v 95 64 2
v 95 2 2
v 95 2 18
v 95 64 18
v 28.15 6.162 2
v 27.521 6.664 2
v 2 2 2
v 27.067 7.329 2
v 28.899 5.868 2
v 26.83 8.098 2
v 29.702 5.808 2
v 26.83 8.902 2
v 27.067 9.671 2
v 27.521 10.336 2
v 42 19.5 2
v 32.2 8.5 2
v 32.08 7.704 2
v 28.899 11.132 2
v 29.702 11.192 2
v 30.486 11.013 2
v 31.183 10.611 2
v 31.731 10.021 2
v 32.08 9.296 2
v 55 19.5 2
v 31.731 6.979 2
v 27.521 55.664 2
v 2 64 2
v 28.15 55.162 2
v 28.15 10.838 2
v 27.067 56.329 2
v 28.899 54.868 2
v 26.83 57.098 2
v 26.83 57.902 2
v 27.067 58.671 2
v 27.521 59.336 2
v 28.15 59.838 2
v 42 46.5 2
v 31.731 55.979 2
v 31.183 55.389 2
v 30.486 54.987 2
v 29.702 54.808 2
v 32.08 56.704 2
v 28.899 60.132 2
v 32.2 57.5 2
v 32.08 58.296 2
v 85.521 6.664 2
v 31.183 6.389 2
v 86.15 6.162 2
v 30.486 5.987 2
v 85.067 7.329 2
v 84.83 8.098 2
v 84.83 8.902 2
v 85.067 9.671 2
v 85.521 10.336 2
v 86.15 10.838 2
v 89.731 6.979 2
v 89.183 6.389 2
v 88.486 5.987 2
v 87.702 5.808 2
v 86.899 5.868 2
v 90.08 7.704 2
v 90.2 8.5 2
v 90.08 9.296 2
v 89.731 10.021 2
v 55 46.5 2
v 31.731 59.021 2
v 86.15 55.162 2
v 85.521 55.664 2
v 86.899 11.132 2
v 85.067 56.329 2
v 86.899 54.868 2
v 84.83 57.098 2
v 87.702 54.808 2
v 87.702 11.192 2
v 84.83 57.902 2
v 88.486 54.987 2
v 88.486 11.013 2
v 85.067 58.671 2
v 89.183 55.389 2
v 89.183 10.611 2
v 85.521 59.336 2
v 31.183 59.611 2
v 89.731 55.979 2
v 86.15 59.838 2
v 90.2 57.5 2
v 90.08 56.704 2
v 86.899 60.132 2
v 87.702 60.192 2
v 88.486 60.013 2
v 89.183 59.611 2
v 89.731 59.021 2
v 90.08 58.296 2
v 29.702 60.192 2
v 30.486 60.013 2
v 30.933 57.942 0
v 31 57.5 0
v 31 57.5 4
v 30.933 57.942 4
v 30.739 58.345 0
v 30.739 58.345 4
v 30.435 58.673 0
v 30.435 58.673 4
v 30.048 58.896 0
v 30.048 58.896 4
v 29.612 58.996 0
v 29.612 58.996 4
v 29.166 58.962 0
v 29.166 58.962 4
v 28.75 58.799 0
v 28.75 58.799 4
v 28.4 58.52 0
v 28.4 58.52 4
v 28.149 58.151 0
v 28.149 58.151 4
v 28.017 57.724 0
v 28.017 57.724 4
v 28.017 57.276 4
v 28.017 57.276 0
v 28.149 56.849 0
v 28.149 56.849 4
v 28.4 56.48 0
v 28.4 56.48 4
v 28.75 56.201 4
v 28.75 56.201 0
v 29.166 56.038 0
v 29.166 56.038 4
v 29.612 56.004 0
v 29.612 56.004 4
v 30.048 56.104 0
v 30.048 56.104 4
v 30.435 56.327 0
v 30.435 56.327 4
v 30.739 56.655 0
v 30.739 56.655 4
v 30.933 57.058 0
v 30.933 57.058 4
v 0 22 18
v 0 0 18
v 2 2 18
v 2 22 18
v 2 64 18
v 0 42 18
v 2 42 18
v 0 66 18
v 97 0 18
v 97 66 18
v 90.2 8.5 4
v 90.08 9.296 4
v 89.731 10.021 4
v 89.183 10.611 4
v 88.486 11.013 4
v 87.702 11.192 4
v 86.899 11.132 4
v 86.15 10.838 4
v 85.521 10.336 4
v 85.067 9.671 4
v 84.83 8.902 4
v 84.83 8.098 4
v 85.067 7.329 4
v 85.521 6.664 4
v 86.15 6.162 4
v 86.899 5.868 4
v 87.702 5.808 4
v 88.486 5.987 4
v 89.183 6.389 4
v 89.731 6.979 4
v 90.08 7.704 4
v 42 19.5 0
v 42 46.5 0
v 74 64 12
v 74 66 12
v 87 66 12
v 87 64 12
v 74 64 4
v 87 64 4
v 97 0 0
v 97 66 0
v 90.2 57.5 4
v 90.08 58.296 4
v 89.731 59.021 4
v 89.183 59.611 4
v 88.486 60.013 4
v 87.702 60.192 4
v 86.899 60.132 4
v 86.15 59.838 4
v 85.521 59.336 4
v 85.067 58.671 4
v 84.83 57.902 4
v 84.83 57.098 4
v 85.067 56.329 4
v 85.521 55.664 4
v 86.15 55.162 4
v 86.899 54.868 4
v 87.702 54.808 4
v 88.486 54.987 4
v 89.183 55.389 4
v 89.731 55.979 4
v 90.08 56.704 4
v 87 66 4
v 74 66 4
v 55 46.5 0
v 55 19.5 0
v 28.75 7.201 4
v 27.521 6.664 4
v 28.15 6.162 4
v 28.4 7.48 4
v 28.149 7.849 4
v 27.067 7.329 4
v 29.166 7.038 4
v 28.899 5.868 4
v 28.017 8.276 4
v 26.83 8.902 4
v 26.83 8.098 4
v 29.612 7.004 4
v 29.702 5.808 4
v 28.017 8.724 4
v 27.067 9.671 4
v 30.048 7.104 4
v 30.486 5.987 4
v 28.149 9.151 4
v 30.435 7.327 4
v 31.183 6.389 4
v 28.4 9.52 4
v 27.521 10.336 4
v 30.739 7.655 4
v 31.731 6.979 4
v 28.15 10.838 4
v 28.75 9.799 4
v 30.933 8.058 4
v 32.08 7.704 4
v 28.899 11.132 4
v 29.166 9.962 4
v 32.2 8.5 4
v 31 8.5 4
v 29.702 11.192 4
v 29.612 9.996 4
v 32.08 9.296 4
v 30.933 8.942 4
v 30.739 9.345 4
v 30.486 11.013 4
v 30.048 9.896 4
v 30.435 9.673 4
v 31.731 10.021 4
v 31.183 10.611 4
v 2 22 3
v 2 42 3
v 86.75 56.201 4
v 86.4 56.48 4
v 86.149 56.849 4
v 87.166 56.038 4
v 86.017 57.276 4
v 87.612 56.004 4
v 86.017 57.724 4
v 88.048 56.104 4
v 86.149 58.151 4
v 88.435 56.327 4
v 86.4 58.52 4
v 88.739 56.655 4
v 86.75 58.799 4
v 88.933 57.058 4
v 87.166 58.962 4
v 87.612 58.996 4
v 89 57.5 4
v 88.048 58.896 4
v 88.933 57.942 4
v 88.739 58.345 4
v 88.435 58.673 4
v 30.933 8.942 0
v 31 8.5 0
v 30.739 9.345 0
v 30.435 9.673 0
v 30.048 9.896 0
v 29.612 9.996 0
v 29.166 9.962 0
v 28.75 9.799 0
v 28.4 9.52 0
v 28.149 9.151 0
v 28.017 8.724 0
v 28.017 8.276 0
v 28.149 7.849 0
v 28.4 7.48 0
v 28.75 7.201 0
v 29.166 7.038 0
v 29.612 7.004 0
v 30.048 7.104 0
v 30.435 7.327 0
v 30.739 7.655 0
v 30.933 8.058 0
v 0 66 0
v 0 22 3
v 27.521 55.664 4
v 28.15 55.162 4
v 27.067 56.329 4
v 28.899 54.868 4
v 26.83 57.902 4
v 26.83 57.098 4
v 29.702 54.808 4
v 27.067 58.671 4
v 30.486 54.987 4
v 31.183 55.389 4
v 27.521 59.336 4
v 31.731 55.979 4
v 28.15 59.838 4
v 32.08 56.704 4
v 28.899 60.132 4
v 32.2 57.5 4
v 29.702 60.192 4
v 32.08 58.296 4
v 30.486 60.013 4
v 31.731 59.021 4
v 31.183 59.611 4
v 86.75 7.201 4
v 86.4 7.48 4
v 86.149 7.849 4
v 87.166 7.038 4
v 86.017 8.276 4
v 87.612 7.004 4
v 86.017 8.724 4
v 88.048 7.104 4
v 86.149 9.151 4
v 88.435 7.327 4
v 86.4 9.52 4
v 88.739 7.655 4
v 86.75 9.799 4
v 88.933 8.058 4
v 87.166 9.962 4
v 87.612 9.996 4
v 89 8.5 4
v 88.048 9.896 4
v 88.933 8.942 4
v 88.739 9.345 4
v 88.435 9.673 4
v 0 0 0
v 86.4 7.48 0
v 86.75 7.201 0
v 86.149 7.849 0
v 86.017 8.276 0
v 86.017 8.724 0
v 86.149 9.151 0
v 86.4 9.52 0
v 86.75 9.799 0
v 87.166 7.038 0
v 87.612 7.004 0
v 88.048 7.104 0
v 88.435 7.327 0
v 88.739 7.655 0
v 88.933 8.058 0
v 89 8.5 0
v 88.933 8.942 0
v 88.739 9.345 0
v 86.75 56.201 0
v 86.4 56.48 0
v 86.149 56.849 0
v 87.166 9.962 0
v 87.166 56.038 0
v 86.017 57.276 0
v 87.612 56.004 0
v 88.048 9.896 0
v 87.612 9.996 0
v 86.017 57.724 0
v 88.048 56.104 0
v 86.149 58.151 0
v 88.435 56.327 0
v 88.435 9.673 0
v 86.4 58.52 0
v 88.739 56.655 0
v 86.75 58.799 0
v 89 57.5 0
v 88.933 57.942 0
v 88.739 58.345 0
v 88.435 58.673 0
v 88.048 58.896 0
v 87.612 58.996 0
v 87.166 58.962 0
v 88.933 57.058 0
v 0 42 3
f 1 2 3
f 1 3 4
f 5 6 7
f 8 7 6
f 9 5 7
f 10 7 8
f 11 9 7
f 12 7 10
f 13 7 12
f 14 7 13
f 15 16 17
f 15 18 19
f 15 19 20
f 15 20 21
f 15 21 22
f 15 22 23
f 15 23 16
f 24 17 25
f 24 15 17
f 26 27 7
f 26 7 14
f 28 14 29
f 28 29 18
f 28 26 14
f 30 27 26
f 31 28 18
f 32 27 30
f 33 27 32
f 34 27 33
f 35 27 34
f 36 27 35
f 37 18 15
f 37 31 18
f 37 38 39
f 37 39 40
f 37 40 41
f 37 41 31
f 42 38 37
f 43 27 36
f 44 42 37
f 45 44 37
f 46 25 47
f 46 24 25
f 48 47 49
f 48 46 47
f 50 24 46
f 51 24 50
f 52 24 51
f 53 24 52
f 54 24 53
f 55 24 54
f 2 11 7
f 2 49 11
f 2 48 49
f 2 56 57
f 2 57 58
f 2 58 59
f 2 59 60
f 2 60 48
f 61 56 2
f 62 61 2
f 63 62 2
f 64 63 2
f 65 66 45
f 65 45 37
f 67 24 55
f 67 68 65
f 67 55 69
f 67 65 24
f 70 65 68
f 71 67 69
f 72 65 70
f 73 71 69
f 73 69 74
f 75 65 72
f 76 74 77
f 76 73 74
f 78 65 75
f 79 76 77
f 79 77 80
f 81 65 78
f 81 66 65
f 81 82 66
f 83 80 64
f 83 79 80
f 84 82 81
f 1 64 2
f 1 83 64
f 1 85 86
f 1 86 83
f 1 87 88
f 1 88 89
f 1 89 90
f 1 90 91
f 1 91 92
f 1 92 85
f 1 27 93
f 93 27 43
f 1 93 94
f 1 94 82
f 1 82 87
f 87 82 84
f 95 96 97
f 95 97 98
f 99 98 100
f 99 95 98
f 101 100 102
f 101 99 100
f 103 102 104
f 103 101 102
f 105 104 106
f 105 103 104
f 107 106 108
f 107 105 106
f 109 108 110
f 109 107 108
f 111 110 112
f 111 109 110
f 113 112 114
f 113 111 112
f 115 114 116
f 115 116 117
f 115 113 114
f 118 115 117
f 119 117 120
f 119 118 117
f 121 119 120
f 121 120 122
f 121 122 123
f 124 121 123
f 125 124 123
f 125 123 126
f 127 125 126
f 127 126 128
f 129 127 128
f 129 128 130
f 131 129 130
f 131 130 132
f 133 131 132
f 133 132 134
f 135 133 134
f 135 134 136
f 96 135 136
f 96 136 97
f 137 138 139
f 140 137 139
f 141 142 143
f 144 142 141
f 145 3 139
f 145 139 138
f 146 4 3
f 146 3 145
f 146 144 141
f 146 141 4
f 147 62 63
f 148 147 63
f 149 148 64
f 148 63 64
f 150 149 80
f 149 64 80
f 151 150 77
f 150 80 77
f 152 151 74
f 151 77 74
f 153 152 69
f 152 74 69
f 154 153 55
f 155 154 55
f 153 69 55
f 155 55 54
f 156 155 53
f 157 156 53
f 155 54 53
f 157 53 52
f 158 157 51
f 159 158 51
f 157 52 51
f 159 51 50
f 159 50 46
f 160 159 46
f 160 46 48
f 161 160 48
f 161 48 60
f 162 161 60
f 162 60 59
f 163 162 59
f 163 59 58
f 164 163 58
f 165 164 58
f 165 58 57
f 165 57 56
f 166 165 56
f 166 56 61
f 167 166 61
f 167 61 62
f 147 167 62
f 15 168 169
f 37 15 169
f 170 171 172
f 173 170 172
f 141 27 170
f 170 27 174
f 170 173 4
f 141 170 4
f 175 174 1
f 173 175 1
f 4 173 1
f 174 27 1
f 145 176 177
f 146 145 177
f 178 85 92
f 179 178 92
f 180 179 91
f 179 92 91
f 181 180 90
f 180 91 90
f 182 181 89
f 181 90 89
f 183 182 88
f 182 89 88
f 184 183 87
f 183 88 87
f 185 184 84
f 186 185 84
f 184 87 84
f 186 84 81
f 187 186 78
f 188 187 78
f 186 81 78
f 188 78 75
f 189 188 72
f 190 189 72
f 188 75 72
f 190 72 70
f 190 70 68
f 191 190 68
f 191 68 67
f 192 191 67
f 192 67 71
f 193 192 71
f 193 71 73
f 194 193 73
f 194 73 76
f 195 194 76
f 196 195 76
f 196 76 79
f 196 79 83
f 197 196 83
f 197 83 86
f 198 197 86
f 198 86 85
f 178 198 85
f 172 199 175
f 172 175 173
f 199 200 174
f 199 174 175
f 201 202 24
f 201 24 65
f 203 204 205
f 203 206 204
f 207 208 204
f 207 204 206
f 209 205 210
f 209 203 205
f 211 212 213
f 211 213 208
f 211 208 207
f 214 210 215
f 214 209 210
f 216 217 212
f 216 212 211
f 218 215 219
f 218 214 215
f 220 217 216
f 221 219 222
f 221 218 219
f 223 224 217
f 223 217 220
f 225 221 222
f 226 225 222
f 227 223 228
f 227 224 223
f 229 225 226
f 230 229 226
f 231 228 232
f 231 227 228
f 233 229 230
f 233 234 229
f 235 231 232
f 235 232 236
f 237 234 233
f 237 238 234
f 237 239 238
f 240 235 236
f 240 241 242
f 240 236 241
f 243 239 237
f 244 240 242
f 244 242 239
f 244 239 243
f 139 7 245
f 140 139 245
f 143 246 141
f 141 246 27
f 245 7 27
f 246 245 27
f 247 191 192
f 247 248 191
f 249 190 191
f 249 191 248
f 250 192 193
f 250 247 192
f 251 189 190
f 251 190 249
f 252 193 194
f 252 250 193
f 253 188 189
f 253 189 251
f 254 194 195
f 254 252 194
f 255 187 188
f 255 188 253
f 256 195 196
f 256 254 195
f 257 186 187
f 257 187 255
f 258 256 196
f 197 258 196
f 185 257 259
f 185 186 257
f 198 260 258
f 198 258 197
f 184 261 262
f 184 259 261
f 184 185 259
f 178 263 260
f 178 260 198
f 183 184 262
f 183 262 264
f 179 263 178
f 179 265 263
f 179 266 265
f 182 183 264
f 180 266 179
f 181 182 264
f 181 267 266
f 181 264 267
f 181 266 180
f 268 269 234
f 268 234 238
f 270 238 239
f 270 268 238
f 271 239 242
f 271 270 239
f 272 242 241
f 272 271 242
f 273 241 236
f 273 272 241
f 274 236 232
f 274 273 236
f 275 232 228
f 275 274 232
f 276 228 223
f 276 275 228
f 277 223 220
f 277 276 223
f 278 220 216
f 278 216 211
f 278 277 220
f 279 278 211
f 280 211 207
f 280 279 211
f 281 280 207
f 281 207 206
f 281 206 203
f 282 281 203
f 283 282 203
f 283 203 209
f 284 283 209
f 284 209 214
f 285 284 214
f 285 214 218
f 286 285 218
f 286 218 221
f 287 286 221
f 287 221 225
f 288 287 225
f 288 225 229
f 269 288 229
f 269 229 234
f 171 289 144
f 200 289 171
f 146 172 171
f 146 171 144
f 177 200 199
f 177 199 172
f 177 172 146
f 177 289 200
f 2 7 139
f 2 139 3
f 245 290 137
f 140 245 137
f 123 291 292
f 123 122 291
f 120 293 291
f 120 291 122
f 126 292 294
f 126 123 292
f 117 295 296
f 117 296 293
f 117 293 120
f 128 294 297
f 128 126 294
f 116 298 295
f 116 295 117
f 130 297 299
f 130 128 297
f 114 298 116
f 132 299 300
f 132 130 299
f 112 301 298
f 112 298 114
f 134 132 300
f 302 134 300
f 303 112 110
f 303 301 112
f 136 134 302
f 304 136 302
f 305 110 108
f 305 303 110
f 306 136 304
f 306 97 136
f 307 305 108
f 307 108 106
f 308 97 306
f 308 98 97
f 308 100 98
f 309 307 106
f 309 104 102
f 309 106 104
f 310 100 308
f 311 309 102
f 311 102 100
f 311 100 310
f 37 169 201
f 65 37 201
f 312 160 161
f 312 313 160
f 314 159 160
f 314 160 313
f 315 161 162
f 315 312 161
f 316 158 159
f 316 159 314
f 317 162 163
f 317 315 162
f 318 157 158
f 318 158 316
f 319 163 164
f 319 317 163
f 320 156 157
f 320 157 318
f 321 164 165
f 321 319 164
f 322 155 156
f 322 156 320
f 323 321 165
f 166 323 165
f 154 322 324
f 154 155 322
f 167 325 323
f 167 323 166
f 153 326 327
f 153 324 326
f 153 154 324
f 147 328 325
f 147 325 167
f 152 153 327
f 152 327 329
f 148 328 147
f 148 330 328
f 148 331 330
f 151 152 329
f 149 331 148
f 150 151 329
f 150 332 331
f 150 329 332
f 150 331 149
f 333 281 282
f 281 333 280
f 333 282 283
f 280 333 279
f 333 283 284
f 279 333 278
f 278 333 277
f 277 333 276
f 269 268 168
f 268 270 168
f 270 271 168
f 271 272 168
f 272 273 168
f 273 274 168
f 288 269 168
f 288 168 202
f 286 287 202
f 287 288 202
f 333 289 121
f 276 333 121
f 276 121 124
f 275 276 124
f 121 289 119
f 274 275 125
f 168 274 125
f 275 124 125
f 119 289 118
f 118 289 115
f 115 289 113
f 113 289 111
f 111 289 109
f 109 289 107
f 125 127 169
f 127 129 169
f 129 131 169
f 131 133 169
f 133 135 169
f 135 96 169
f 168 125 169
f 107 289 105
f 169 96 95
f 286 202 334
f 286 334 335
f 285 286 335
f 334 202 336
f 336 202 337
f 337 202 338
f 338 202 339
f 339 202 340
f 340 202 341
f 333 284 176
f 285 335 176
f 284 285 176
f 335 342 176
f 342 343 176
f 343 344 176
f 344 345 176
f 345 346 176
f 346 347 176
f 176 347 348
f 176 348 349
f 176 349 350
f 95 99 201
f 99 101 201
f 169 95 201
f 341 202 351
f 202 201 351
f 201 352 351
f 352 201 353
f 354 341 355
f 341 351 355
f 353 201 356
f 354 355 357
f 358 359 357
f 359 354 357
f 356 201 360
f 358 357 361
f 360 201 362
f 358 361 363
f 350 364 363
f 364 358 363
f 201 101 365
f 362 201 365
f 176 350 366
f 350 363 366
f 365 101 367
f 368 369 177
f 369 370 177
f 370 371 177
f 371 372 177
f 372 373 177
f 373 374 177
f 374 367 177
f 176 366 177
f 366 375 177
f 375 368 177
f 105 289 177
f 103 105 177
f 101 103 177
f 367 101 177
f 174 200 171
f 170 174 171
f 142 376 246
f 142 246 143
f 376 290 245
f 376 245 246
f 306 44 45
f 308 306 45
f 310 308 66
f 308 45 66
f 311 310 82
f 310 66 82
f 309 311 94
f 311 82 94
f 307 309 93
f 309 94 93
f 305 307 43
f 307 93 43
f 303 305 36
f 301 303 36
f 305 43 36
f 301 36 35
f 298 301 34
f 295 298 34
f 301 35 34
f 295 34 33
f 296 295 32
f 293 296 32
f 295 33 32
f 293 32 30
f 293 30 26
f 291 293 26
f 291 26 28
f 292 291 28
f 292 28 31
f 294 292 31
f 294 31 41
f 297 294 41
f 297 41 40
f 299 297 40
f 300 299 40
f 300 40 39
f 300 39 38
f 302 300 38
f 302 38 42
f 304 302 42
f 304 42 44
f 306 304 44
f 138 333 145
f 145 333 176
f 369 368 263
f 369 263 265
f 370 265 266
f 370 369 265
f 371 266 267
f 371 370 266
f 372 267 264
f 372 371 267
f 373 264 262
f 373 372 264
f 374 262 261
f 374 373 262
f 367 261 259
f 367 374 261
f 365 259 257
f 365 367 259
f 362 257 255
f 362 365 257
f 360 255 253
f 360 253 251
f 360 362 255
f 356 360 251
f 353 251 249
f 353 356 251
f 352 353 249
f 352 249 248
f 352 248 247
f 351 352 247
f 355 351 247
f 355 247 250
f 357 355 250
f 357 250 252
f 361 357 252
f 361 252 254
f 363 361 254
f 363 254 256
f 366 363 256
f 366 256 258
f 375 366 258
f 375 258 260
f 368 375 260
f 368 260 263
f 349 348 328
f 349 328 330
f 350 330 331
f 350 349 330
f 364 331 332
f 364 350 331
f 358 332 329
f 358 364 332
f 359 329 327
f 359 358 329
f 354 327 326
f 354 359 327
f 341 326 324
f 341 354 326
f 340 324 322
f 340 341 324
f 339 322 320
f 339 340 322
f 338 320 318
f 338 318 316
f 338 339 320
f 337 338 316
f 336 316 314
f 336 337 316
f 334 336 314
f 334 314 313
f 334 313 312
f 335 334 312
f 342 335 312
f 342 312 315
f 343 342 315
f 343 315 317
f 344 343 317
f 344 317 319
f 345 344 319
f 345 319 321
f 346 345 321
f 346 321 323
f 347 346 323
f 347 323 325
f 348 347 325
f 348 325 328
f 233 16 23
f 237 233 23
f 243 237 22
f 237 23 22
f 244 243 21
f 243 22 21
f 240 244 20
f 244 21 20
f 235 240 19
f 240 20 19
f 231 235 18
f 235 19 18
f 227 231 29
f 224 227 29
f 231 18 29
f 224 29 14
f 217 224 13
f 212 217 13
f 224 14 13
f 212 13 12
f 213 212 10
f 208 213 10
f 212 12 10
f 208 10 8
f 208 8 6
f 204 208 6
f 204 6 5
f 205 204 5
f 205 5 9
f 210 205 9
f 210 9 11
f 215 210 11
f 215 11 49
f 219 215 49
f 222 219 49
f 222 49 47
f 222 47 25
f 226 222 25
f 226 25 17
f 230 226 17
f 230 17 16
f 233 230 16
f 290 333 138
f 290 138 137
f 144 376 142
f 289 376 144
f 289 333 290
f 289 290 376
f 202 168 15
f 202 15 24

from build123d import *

# Parameters (mm, degrees)
SKETCH006_W     = 97
SKETCH006_H     = 66
SKETCH006_R     = 1.5
SKETCH006_W_2   = 13
SKETCH006_H_2   = 27
PAD004_DEPTH    = 2
SKETCH007_W     = 97
SKETCH007_H     = 66
SKETCH007_W_2   = 93
SKETCH007_H_2   = 62
PAD005_DEPTH    = 18
SKETCH008_R     = 2.7
SKETCH008_R_2   = 1.5
PAD006_DEPTH    = 4
SKETCH012_W     = 13
SKETCH012_H     = 8
POCKET001_DEPTH = 2
SKETCH026_W     = 20
SKETCH026_H     = 15
POCKET007_DEPTH = 2


with BuildPart() as part:
    # Sketch006 → Pad004 (new body)
    with BuildSketch(Plane.XY):
        with Locations((48.5, 33)):
            Rectangle(SKETCH006_W, SKETCH006_H)
        with Locations((87.5, 57.5)):
            Circle(SKETCH006_R, mode=Mode.SUBTRACT)
        with Locations((87.5, 8.5)):
            Circle(SKETCH006_R, mode=Mode.SUBTRACT)
        with Locations((29.5, 57.5)):
            Circle(SKETCH006_R, mode=Mode.SUBTRACT)
        with Locations((29.5, 8.5)):
            Circle(SKETCH006_R, mode=Mode.SUBTRACT)
        with Locations((48.5, 33)):
            Rectangle(SKETCH006_W_2, SKETCH006_H_2, mode=Mode.SUBTRACT)
    extrude(amount=PAD004_DEPTH)

    # Sketch007 → Pad005 (join)
    with BuildSketch(Plane.XY):
        with Locations((48.5, 33)):
            Rectangle(SKETCH007_W, SKETCH007_H)
        with Locations((48.5, 33)):
            Rectangle(SKETCH007_W_2, SKETCH007_H_2, mode=Mode.SUBTRACT)
    extrude(amount=PAD005_DEPTH)

    # Sketch008 → Pad006 (join)
    with BuildSketch(Plane.XY):
        with Locations((29.5, 57.5)):
            Circle(SKETCH008_R)
        with Locations((29.5, 57.5)):
            Circle(SKETCH008_R_2, mode=Mode.SUBTRACT)
        with Locations((87.5, 57.5)):
            Circle(SKETCH008_R)
        with Locations((87.5, 57.5)):
            Circle(SKETCH008_R_2, mode=Mode.SUBTRACT)
        with Locations((87.5, 8.5)):
            Circle(SKETCH008_R)
        with Locations((87.5, 8.5)):
            Circle(SKETCH008_R_2, mode=Mode.SUBTRACT)
        with Locations((29.5, 8.5)):
            Circle(SKETCH008_R)
        with Locations((29.5, 8.5)):
            Circle(SKETCH008_R_2, mode=Mode.SUBTRACT)
    extrude(amount=PAD006_DEPTH)

    # Sketch012 → Pocket001 (cut)
    with BuildSketch(Plane(origin=(74, 66, 4), x_dir=(1, 0, 0), z_dir=(0, -1, 0))):
        with Locations((6.5, 4)):
            Rectangle(SKETCH012_W, SKETCH012_H)
    extrude(amount=POCKET001_DEPTH, mode=Mode.SUBTRACT)

    # Sketch026 → Pocket007 (cut)
    with BuildSketch(Plane.YZ):
        with Locations((32, 10.5)):
            Rectangle(SKETCH026_W, SKETCH026_H)
    extrude(amount=POCKET007_DEPTH, mode=Mode.SUBTRACT)


solid = part.part
